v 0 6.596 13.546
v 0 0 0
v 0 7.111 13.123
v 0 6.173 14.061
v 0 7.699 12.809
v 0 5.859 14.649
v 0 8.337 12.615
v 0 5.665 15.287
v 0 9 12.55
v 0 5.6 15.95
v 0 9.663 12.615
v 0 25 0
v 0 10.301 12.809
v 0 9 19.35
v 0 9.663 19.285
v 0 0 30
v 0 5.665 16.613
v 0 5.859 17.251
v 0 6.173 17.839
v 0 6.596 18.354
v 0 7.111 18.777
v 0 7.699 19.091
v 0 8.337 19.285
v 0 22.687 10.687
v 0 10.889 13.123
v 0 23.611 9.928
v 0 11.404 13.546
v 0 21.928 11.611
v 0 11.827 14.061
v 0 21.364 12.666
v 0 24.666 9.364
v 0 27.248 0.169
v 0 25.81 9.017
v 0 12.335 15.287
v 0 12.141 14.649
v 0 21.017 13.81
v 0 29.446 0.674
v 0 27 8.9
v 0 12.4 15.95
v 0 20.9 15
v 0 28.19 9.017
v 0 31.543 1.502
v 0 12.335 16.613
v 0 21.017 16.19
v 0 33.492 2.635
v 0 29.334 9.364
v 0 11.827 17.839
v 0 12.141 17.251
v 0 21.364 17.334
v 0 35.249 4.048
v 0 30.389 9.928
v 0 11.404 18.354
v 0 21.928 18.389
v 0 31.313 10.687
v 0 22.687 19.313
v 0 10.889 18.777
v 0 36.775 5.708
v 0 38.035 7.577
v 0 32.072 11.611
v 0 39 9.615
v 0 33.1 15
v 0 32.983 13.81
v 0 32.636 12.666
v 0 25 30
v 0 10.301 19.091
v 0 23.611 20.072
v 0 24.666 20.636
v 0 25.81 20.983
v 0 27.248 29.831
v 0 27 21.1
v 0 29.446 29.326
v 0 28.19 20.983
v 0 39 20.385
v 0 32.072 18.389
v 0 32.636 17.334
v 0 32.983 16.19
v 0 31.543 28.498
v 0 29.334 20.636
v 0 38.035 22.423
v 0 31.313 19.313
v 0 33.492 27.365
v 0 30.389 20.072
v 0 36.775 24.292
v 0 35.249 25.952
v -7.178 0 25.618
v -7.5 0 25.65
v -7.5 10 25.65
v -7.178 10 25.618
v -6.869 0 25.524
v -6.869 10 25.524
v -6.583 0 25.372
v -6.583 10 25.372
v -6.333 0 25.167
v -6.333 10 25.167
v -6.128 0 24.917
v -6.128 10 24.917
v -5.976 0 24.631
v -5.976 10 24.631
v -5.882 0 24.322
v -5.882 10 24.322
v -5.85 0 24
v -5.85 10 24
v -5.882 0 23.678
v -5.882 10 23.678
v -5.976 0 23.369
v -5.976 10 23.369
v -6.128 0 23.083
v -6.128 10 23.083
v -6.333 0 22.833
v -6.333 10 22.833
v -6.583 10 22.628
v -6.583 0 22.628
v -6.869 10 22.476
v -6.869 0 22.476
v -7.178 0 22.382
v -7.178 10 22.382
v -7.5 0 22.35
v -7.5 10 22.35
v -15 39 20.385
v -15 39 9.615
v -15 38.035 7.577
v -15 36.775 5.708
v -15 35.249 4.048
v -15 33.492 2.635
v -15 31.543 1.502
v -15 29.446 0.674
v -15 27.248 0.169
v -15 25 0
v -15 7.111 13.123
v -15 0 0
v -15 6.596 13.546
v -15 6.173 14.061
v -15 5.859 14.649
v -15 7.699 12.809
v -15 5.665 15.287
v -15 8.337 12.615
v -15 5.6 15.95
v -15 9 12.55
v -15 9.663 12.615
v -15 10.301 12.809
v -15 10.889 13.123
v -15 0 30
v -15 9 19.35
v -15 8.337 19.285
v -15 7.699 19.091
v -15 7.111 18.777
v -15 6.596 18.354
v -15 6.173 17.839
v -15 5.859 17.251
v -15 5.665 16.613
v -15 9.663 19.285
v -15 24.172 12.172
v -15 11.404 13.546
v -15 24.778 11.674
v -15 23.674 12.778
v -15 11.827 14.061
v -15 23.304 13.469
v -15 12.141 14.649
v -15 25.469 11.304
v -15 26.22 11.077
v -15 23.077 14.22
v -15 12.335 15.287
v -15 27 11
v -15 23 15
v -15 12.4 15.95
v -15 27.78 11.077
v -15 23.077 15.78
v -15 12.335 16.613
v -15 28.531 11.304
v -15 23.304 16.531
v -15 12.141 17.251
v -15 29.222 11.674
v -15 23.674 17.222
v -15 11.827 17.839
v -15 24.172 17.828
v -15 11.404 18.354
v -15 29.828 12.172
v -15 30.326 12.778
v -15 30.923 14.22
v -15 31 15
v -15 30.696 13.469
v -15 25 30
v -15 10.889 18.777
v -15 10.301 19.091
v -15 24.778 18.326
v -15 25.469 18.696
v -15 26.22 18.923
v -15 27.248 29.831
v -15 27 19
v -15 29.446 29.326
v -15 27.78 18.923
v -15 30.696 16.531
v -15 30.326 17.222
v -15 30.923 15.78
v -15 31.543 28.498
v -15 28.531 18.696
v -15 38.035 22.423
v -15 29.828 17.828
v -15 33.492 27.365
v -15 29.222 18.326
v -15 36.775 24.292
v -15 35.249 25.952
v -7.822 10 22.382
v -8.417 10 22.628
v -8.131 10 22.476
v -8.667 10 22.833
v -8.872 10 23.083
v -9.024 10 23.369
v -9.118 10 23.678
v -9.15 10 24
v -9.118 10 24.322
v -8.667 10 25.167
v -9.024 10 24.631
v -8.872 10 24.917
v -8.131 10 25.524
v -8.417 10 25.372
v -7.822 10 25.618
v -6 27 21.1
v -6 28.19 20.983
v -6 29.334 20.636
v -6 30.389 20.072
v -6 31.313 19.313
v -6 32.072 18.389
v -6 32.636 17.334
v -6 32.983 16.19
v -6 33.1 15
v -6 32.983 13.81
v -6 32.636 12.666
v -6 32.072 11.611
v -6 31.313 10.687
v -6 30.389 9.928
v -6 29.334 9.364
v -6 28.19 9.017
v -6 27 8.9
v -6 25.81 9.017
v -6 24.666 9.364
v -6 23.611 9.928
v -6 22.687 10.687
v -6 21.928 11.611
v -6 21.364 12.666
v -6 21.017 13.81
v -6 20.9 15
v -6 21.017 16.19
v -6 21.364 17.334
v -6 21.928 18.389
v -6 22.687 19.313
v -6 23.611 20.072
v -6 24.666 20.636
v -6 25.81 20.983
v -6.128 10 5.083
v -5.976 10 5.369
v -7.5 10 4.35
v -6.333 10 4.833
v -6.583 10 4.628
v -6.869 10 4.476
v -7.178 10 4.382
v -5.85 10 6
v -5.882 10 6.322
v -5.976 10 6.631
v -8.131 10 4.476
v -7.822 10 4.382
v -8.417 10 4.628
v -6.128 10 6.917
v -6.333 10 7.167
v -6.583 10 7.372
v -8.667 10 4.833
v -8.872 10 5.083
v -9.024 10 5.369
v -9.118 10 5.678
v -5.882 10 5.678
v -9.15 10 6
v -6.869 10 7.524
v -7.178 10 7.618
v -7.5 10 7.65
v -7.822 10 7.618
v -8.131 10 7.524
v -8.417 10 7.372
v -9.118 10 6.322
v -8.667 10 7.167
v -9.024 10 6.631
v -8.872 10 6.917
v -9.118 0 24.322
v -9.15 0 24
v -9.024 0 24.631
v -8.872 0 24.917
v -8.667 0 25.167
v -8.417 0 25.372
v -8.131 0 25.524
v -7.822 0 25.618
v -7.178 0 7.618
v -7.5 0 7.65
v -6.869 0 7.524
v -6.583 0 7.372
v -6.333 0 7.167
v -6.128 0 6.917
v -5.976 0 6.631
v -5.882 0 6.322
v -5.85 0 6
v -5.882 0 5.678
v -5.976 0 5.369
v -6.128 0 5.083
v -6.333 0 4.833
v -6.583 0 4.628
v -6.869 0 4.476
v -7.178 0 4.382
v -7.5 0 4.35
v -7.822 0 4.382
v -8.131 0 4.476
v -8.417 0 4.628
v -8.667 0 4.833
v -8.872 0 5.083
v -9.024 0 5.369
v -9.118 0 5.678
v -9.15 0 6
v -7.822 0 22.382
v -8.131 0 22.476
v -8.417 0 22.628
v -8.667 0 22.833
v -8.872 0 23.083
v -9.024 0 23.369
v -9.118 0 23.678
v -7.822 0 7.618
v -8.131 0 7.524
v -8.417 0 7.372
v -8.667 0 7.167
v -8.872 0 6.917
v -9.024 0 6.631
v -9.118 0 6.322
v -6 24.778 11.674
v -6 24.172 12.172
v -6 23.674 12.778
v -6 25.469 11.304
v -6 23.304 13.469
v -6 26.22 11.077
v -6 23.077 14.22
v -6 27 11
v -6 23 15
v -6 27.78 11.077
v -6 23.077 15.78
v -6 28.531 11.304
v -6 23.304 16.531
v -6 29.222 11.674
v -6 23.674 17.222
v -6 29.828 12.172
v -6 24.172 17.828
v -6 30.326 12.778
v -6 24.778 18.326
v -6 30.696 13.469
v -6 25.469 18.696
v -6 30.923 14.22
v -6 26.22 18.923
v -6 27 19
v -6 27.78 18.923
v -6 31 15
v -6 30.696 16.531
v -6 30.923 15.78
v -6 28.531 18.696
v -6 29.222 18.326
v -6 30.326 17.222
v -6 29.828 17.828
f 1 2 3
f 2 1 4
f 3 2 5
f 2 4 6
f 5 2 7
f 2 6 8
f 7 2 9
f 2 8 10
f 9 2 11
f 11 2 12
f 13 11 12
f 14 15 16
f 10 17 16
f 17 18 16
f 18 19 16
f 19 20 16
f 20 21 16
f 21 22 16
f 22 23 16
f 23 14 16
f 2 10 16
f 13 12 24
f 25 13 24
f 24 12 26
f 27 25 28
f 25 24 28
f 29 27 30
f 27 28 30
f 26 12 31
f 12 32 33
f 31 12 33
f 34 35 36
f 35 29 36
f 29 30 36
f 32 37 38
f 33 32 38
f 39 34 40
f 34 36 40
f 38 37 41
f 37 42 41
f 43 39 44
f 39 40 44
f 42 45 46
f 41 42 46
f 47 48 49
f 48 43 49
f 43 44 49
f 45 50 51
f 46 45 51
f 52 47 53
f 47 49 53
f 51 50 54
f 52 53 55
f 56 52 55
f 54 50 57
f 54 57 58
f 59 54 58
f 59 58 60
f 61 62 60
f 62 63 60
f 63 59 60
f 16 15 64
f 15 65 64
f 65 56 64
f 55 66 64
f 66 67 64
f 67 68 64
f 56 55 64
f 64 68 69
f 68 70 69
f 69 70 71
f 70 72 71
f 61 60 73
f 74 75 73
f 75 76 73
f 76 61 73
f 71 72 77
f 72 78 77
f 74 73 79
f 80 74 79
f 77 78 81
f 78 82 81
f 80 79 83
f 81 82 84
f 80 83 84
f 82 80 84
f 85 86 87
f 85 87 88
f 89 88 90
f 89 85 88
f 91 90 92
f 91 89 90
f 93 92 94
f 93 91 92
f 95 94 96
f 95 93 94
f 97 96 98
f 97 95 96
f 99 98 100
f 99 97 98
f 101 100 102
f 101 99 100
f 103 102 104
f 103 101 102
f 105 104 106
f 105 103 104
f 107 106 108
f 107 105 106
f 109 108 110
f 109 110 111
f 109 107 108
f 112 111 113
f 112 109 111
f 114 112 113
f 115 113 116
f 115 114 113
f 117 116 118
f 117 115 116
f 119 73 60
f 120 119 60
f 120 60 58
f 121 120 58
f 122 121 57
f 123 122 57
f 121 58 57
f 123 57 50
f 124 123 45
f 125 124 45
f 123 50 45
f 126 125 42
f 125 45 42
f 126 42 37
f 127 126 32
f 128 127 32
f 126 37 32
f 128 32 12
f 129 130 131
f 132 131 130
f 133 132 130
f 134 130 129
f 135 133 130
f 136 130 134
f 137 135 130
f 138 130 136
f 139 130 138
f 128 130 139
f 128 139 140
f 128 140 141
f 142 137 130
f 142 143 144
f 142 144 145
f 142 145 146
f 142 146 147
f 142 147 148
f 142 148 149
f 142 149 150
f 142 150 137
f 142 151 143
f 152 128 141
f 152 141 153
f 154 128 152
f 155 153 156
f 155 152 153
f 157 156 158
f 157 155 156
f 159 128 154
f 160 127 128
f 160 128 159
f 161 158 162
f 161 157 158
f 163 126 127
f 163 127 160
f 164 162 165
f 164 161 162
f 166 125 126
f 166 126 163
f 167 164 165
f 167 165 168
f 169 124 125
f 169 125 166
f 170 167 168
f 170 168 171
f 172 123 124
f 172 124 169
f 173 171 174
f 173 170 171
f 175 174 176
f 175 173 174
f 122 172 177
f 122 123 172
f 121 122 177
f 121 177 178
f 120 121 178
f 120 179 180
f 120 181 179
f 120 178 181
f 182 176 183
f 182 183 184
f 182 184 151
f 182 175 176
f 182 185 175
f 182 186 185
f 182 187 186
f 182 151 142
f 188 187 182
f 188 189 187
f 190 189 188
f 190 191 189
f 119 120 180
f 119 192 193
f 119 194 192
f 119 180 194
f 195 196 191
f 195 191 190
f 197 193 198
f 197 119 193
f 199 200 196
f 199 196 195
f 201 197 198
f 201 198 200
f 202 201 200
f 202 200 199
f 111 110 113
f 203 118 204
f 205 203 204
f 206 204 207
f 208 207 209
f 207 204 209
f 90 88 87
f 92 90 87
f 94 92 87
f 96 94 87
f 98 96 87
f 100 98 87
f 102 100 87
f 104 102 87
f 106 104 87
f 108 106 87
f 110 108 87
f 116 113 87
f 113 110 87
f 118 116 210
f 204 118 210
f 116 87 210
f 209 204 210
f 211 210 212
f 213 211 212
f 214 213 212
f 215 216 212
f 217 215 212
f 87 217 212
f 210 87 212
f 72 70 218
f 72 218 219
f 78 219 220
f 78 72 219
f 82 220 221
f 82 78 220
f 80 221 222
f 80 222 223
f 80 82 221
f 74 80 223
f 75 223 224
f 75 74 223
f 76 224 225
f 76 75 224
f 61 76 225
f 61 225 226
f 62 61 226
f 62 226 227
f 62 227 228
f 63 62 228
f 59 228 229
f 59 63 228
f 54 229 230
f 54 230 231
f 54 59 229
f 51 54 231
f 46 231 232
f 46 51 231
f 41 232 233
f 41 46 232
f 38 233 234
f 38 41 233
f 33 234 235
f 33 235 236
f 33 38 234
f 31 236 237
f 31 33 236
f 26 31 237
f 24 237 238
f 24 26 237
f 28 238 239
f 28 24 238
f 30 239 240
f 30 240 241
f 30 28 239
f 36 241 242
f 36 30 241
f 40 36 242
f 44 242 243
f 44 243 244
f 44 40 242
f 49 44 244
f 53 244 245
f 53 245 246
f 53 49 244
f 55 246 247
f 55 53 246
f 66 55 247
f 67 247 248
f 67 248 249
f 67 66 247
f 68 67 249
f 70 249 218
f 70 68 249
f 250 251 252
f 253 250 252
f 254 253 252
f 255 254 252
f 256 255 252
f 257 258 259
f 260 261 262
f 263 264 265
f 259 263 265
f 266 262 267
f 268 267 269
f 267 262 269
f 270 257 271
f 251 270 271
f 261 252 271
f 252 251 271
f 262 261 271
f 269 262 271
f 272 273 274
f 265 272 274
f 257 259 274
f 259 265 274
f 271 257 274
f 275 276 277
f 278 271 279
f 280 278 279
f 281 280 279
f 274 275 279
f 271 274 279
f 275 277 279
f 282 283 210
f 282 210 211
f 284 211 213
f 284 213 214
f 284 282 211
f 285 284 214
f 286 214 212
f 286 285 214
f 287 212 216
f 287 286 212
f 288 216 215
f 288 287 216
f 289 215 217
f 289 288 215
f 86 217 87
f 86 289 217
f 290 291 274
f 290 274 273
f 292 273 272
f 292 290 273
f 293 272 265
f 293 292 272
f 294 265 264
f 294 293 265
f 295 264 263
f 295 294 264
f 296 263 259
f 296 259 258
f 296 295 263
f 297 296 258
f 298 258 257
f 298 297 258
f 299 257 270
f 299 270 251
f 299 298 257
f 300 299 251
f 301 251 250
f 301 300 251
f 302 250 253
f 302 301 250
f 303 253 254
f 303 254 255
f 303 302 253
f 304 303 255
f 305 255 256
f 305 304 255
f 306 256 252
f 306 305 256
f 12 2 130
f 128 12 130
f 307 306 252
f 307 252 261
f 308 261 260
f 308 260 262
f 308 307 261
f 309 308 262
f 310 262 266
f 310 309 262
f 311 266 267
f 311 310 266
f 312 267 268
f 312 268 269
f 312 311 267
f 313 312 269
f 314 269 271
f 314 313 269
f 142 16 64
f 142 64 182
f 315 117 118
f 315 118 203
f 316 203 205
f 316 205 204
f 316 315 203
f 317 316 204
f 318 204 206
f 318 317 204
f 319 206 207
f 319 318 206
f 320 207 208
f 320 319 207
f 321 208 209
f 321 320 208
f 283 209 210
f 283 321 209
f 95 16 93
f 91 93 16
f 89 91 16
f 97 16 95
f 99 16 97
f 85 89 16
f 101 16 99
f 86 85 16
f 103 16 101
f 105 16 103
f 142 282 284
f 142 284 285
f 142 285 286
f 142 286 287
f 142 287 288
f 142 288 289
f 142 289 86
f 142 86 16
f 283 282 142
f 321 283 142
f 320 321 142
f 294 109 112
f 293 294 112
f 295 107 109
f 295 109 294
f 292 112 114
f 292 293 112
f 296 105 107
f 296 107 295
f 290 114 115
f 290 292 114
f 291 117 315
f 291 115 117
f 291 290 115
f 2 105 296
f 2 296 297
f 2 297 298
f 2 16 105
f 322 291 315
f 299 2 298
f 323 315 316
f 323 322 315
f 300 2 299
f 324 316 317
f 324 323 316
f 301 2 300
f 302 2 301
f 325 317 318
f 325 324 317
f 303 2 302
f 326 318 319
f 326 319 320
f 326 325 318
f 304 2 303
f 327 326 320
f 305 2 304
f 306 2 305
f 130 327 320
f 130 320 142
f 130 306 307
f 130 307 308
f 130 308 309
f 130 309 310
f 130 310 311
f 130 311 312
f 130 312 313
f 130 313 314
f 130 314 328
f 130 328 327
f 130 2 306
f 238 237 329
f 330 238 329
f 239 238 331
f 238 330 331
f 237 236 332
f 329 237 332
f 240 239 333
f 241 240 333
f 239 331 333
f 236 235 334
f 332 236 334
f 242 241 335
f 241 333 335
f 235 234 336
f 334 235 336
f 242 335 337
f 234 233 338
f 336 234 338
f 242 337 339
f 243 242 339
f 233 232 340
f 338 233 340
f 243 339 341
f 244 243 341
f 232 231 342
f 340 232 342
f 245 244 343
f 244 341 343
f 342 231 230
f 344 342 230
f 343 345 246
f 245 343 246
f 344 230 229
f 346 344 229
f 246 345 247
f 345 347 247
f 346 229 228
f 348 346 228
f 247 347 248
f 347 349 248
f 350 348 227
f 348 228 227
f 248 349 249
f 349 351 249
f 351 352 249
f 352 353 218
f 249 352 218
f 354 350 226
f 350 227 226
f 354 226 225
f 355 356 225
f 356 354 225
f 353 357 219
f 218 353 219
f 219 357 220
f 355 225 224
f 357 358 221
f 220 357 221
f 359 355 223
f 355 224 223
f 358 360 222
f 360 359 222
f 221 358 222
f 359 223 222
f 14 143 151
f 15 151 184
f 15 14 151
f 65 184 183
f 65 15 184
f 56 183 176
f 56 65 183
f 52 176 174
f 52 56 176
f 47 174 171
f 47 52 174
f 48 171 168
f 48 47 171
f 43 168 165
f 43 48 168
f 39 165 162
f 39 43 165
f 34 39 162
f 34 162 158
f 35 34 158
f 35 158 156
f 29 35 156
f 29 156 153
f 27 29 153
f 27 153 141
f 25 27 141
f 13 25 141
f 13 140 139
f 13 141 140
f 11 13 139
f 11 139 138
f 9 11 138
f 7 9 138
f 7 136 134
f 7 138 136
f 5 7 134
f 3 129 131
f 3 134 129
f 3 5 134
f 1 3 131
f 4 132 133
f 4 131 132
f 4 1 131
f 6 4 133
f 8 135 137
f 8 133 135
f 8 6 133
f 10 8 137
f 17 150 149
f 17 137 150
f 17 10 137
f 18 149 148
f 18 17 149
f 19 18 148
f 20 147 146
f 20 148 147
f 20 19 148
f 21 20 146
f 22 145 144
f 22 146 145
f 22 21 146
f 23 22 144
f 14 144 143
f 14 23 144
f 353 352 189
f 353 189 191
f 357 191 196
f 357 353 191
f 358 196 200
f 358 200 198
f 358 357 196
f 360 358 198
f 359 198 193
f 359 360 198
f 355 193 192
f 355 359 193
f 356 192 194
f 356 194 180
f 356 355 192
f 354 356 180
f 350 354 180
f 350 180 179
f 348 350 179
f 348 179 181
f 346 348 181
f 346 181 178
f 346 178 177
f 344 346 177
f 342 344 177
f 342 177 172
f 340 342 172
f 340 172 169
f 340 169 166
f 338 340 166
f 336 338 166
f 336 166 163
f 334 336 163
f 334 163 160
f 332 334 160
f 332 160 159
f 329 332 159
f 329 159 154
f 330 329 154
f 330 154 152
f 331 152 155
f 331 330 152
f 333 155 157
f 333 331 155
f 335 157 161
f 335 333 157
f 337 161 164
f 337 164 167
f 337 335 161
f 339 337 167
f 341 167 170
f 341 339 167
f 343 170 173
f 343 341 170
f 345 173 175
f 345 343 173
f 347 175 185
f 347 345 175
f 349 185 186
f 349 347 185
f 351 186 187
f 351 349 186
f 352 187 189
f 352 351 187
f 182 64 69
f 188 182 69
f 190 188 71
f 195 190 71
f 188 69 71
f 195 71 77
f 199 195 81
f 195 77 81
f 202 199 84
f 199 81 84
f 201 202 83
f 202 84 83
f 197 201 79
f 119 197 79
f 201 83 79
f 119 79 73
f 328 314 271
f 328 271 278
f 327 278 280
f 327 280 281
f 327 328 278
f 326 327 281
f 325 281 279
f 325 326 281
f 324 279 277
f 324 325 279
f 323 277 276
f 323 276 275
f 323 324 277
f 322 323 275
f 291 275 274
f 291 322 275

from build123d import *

# Parameters (mm, degrees)
SKETCH_1_W               = 15
SKETCH_1_H               = 30
EXTRUDE_1_DEPTH          = 25
SKETCH_3_R               = 15
EXTRUDE_3_DEPTH          = 15
CUT_EXTRUDE_2_DEPTH      = 10
SKETCH_9_R               = 6.1
CUT_EXTRUDE_3_DEPTH      = 6
SKETCH_10_R              = 4
CUT_EXTRUDE_4_DEPTH      = 51.803543184
CUT_EXTRUDE_6_DEPTH      = 53.201532545
CUT_EXTRUDE_6_DEPTH_BACK = 53.201532545
SKETCH_5_R               = 3.4
CUT_EXTRUDE_8_DEPTH      = 52.439284598


with BuildPart() as part:
    # 草图1 → 凸台-拉伸1 (new body)
    with BuildSketch(Plane(origin=(0, 0, 0), x_dir=(1, 0, 0), z_dir=(0, 1, 0))):
        with Locations((7.5, -15)):
            Rectangle(SKETCH_1_W, SKETCH_1_H)
    extrude(amount=EXTRUDE_1_DEPTH)

    # 草图3 → 凸台-拉伸3 (add)
    with BuildSketch(Plane.ZY):
        with Locations((15, 25)):
            Circle(SKETCH_3_R)
    extrude(amount=-EXTRUDE_3_DEPTH)

    # 草图4 → 切除-拉伸2 (cut)
    with BuildSketch(Plane.XZ):
        with BuildLine():
            ThreePointArc((9.15, 24), (8.666726189, 25.166726189), (7.5, 25.65))
            Line((7.5, 25.65), (7.5, 22.35))
            ThreePointArc((7.5, 22.35), (8.666726189, 22.833273811), (9.15, 24))
        make_face()
        with BuildLine():
            Line((7.5, 22.35), (7.5, 25.65))
            ThreePointArc((7.5, 25.65), (5.85, 24), (7.5, 22.35))
        make_face()
        with BuildLine():
            ThreePointArc((9.15, 6), (8.666726189, 7.166726189), (7.5, 7.65))
            Line((7.5, 7.65), (7.5, 4.35))
            ThreePointArc((7.5, 4.35), (8.666726189, 4.833273811), (9.15, 6))
        make_face()
        with BuildLine():
            Line((7.5, 4.35), (7.5, 7.65))
            ThreePointArc((7.5, 7.65), (5.85, 6), (7.5, 4.35))
        make_face()
    extrude(amount=-CUT_EXTRUDE_2_DEPTH, mode=Mode.SUBTRACT)

    # 草图9 → 切除-拉伸3 (cut)
    with BuildSketch(Plane.ZY):
        with Locations((15, 27)):
            Circle(SKETCH_9_R)
    extrude(amount=-CUT_EXTRUDE_3_DEPTH, mode=Mode.SUBTRACT)

    # 草图10 → 切除-拉伸4 (cut, through all)
    with BuildSketch(Plane.ZY.offset(-6)):
        with Locations((15, 27)):
            Circle(SKETCH_10_R)
    extrude(amount=-CUT_EXTRUDE_4_DEPTH, mode=Mode.SUBTRACT)


with BuildPart() as body_2:
    # 镜向1: mirrored copy
    add(part.part.mirror(Plane(origin=(0, 0, 0), x_dir=(0, 0, 1), z_dir=(1, 0, 0))))

    # 草图12 → 切除-拉伸6 (cut, two sides: drawn at the far end of the back side and taken through both)
    with BuildSketch(Plane(origin=(0, 0, 0), x_dir=(0, 0, -1), z_dir=(1, 0, 0)).offset(-CUT_EXTRUDE_6_DEPTH_BACK)):
        with BuildLine():
            ThreePointArc((-9.614835193, 39), (-15, 40), (-20.385164807, 39))
            Line((-20.385164807, 39), (-9.614835193, 39))
        make_face()
    extrude(amount=CUT_EXTRUDE_6_DEPTH + CUT_EXTRUDE_6_DEPTH_BACK, mode=Mode.SUBTRACT)

    # 草图5 → 切除-拉伸8 (cut, through all)
    with BuildSketch(Plane.ZY):
        with Locations((15.95, 9)):
            Circle(SKETCH_5_R)
    extrude(amount=CUT_EXTRUDE_8_DEPTH, mode=Mode.SUBTRACT)


solid = body_2.part
